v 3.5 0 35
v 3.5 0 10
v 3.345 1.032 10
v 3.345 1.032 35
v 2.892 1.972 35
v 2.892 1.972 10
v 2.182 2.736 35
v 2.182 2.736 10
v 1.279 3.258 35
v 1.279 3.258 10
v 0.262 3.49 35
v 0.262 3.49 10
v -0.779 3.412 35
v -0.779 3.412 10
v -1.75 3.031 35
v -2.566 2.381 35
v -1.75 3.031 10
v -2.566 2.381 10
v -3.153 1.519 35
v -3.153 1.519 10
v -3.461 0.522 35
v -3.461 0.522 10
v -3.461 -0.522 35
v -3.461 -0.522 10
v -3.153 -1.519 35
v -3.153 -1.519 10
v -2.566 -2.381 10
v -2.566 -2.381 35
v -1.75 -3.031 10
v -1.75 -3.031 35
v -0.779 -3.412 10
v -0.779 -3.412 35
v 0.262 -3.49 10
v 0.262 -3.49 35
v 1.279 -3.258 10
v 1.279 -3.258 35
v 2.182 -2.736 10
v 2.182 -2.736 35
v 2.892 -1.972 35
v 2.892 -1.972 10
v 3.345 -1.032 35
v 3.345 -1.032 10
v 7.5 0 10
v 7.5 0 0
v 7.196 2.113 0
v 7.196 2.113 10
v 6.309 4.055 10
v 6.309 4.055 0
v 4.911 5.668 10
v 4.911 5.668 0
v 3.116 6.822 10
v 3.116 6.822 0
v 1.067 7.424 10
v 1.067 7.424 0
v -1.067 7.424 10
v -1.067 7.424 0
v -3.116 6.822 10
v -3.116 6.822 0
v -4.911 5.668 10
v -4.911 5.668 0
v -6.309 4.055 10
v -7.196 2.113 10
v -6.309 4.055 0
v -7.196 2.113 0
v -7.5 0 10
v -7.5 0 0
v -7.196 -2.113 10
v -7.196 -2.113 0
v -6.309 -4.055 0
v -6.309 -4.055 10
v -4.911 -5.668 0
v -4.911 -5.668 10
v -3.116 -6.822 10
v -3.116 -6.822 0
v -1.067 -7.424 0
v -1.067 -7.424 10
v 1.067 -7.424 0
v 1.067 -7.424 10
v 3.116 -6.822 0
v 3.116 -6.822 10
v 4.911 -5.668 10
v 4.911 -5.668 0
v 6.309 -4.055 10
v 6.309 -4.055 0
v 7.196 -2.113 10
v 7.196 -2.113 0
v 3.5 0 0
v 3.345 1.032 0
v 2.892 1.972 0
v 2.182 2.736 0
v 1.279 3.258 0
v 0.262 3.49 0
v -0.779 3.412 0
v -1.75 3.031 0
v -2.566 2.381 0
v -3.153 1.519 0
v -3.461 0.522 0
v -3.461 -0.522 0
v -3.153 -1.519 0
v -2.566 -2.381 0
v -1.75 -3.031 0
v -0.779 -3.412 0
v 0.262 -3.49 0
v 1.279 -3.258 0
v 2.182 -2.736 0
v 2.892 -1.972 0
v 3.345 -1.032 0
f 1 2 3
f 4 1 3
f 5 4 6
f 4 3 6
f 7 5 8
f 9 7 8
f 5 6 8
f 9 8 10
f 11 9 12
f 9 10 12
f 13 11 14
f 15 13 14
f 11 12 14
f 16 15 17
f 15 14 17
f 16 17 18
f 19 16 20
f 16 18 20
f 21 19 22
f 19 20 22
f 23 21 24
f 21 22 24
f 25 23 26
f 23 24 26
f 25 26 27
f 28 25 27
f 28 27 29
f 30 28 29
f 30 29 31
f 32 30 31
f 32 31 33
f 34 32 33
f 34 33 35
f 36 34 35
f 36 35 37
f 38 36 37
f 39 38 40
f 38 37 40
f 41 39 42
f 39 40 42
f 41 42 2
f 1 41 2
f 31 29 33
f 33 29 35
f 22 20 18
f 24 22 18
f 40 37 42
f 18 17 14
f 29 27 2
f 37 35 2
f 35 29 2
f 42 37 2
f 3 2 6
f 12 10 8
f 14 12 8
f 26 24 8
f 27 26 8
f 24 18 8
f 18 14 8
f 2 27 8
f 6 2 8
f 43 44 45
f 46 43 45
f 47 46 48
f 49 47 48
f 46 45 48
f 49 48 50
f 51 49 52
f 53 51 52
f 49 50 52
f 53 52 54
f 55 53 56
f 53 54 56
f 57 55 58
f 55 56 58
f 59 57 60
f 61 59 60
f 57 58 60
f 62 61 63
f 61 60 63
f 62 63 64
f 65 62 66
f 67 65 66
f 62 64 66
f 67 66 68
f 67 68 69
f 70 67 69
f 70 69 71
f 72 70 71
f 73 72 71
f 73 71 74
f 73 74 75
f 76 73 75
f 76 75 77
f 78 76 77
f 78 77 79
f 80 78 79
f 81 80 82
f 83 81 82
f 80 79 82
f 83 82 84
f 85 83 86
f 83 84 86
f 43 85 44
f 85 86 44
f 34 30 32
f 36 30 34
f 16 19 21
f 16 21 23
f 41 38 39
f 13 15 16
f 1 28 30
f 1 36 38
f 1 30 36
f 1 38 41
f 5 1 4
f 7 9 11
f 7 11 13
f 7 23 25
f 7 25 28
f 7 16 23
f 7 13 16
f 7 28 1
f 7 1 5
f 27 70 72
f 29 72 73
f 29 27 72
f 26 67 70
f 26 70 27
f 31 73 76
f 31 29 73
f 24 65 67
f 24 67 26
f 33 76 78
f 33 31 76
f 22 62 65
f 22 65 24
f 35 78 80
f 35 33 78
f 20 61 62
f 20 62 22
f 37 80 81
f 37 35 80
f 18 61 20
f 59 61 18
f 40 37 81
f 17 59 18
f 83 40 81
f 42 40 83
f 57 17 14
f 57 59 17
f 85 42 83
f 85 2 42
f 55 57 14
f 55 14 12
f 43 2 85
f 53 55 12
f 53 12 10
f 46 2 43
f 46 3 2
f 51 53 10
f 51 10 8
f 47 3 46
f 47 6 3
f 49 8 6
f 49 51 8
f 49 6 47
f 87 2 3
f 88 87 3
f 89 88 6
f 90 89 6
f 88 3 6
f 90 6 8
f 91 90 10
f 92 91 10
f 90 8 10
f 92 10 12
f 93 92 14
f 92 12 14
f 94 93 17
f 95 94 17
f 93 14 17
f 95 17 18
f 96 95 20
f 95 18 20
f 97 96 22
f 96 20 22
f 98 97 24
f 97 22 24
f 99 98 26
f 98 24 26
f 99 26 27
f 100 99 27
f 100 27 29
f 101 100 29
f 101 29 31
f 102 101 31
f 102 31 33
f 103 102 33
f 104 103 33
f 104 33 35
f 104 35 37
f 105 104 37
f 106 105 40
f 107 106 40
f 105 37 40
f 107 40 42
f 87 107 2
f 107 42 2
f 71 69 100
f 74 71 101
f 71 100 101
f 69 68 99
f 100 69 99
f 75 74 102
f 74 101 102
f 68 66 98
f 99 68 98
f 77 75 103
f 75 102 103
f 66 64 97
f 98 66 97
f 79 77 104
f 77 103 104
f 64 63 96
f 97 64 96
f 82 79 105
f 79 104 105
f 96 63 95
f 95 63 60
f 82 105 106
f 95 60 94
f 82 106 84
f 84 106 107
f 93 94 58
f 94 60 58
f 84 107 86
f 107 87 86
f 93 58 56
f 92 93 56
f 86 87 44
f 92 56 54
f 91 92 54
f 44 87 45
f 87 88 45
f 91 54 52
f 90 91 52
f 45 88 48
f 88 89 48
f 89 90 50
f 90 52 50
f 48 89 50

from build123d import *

# Parameters (mm, degrees)
SKETCH1_R           = 7.5
BOSS_EXTRUDE1_DEPTH = 10
SKETCH2_R           = 3.5
CUT_EXTRUDE1_DEPTH  = 10
SKETCH3_R           = 3.5
BOSS_EXTRUDE2_DEPTH = 25


with BuildPart() as part:
    # Sketch1 → Boss-Extrude1 (new body)
    with BuildSketch(Plane.XY):
        Circle(SKETCH1_R)
    extrude(amount=BOSS_EXTRUDE1_DEPTH)

    # Sketch2 → Cut-Extrude1 (cut)
    with BuildSketch(Plane.XY.offset(10)):
        Circle(SKETCH2_R)
    extrude(amount=-CUT_EXTRUDE1_DEPTH, mode=Mode.SUBTRACT)


with BuildPart() as body_2:
    # Sketch3 → Boss-Extrude2 (new body)
    with BuildSketch(Plane.XY.offset(10)):
        Circle(SKETCH3_R)
    extrude(amount=BOSS_EXTRUDE2_DEPTH)


solid = Compound([part.part, body_2.part])
